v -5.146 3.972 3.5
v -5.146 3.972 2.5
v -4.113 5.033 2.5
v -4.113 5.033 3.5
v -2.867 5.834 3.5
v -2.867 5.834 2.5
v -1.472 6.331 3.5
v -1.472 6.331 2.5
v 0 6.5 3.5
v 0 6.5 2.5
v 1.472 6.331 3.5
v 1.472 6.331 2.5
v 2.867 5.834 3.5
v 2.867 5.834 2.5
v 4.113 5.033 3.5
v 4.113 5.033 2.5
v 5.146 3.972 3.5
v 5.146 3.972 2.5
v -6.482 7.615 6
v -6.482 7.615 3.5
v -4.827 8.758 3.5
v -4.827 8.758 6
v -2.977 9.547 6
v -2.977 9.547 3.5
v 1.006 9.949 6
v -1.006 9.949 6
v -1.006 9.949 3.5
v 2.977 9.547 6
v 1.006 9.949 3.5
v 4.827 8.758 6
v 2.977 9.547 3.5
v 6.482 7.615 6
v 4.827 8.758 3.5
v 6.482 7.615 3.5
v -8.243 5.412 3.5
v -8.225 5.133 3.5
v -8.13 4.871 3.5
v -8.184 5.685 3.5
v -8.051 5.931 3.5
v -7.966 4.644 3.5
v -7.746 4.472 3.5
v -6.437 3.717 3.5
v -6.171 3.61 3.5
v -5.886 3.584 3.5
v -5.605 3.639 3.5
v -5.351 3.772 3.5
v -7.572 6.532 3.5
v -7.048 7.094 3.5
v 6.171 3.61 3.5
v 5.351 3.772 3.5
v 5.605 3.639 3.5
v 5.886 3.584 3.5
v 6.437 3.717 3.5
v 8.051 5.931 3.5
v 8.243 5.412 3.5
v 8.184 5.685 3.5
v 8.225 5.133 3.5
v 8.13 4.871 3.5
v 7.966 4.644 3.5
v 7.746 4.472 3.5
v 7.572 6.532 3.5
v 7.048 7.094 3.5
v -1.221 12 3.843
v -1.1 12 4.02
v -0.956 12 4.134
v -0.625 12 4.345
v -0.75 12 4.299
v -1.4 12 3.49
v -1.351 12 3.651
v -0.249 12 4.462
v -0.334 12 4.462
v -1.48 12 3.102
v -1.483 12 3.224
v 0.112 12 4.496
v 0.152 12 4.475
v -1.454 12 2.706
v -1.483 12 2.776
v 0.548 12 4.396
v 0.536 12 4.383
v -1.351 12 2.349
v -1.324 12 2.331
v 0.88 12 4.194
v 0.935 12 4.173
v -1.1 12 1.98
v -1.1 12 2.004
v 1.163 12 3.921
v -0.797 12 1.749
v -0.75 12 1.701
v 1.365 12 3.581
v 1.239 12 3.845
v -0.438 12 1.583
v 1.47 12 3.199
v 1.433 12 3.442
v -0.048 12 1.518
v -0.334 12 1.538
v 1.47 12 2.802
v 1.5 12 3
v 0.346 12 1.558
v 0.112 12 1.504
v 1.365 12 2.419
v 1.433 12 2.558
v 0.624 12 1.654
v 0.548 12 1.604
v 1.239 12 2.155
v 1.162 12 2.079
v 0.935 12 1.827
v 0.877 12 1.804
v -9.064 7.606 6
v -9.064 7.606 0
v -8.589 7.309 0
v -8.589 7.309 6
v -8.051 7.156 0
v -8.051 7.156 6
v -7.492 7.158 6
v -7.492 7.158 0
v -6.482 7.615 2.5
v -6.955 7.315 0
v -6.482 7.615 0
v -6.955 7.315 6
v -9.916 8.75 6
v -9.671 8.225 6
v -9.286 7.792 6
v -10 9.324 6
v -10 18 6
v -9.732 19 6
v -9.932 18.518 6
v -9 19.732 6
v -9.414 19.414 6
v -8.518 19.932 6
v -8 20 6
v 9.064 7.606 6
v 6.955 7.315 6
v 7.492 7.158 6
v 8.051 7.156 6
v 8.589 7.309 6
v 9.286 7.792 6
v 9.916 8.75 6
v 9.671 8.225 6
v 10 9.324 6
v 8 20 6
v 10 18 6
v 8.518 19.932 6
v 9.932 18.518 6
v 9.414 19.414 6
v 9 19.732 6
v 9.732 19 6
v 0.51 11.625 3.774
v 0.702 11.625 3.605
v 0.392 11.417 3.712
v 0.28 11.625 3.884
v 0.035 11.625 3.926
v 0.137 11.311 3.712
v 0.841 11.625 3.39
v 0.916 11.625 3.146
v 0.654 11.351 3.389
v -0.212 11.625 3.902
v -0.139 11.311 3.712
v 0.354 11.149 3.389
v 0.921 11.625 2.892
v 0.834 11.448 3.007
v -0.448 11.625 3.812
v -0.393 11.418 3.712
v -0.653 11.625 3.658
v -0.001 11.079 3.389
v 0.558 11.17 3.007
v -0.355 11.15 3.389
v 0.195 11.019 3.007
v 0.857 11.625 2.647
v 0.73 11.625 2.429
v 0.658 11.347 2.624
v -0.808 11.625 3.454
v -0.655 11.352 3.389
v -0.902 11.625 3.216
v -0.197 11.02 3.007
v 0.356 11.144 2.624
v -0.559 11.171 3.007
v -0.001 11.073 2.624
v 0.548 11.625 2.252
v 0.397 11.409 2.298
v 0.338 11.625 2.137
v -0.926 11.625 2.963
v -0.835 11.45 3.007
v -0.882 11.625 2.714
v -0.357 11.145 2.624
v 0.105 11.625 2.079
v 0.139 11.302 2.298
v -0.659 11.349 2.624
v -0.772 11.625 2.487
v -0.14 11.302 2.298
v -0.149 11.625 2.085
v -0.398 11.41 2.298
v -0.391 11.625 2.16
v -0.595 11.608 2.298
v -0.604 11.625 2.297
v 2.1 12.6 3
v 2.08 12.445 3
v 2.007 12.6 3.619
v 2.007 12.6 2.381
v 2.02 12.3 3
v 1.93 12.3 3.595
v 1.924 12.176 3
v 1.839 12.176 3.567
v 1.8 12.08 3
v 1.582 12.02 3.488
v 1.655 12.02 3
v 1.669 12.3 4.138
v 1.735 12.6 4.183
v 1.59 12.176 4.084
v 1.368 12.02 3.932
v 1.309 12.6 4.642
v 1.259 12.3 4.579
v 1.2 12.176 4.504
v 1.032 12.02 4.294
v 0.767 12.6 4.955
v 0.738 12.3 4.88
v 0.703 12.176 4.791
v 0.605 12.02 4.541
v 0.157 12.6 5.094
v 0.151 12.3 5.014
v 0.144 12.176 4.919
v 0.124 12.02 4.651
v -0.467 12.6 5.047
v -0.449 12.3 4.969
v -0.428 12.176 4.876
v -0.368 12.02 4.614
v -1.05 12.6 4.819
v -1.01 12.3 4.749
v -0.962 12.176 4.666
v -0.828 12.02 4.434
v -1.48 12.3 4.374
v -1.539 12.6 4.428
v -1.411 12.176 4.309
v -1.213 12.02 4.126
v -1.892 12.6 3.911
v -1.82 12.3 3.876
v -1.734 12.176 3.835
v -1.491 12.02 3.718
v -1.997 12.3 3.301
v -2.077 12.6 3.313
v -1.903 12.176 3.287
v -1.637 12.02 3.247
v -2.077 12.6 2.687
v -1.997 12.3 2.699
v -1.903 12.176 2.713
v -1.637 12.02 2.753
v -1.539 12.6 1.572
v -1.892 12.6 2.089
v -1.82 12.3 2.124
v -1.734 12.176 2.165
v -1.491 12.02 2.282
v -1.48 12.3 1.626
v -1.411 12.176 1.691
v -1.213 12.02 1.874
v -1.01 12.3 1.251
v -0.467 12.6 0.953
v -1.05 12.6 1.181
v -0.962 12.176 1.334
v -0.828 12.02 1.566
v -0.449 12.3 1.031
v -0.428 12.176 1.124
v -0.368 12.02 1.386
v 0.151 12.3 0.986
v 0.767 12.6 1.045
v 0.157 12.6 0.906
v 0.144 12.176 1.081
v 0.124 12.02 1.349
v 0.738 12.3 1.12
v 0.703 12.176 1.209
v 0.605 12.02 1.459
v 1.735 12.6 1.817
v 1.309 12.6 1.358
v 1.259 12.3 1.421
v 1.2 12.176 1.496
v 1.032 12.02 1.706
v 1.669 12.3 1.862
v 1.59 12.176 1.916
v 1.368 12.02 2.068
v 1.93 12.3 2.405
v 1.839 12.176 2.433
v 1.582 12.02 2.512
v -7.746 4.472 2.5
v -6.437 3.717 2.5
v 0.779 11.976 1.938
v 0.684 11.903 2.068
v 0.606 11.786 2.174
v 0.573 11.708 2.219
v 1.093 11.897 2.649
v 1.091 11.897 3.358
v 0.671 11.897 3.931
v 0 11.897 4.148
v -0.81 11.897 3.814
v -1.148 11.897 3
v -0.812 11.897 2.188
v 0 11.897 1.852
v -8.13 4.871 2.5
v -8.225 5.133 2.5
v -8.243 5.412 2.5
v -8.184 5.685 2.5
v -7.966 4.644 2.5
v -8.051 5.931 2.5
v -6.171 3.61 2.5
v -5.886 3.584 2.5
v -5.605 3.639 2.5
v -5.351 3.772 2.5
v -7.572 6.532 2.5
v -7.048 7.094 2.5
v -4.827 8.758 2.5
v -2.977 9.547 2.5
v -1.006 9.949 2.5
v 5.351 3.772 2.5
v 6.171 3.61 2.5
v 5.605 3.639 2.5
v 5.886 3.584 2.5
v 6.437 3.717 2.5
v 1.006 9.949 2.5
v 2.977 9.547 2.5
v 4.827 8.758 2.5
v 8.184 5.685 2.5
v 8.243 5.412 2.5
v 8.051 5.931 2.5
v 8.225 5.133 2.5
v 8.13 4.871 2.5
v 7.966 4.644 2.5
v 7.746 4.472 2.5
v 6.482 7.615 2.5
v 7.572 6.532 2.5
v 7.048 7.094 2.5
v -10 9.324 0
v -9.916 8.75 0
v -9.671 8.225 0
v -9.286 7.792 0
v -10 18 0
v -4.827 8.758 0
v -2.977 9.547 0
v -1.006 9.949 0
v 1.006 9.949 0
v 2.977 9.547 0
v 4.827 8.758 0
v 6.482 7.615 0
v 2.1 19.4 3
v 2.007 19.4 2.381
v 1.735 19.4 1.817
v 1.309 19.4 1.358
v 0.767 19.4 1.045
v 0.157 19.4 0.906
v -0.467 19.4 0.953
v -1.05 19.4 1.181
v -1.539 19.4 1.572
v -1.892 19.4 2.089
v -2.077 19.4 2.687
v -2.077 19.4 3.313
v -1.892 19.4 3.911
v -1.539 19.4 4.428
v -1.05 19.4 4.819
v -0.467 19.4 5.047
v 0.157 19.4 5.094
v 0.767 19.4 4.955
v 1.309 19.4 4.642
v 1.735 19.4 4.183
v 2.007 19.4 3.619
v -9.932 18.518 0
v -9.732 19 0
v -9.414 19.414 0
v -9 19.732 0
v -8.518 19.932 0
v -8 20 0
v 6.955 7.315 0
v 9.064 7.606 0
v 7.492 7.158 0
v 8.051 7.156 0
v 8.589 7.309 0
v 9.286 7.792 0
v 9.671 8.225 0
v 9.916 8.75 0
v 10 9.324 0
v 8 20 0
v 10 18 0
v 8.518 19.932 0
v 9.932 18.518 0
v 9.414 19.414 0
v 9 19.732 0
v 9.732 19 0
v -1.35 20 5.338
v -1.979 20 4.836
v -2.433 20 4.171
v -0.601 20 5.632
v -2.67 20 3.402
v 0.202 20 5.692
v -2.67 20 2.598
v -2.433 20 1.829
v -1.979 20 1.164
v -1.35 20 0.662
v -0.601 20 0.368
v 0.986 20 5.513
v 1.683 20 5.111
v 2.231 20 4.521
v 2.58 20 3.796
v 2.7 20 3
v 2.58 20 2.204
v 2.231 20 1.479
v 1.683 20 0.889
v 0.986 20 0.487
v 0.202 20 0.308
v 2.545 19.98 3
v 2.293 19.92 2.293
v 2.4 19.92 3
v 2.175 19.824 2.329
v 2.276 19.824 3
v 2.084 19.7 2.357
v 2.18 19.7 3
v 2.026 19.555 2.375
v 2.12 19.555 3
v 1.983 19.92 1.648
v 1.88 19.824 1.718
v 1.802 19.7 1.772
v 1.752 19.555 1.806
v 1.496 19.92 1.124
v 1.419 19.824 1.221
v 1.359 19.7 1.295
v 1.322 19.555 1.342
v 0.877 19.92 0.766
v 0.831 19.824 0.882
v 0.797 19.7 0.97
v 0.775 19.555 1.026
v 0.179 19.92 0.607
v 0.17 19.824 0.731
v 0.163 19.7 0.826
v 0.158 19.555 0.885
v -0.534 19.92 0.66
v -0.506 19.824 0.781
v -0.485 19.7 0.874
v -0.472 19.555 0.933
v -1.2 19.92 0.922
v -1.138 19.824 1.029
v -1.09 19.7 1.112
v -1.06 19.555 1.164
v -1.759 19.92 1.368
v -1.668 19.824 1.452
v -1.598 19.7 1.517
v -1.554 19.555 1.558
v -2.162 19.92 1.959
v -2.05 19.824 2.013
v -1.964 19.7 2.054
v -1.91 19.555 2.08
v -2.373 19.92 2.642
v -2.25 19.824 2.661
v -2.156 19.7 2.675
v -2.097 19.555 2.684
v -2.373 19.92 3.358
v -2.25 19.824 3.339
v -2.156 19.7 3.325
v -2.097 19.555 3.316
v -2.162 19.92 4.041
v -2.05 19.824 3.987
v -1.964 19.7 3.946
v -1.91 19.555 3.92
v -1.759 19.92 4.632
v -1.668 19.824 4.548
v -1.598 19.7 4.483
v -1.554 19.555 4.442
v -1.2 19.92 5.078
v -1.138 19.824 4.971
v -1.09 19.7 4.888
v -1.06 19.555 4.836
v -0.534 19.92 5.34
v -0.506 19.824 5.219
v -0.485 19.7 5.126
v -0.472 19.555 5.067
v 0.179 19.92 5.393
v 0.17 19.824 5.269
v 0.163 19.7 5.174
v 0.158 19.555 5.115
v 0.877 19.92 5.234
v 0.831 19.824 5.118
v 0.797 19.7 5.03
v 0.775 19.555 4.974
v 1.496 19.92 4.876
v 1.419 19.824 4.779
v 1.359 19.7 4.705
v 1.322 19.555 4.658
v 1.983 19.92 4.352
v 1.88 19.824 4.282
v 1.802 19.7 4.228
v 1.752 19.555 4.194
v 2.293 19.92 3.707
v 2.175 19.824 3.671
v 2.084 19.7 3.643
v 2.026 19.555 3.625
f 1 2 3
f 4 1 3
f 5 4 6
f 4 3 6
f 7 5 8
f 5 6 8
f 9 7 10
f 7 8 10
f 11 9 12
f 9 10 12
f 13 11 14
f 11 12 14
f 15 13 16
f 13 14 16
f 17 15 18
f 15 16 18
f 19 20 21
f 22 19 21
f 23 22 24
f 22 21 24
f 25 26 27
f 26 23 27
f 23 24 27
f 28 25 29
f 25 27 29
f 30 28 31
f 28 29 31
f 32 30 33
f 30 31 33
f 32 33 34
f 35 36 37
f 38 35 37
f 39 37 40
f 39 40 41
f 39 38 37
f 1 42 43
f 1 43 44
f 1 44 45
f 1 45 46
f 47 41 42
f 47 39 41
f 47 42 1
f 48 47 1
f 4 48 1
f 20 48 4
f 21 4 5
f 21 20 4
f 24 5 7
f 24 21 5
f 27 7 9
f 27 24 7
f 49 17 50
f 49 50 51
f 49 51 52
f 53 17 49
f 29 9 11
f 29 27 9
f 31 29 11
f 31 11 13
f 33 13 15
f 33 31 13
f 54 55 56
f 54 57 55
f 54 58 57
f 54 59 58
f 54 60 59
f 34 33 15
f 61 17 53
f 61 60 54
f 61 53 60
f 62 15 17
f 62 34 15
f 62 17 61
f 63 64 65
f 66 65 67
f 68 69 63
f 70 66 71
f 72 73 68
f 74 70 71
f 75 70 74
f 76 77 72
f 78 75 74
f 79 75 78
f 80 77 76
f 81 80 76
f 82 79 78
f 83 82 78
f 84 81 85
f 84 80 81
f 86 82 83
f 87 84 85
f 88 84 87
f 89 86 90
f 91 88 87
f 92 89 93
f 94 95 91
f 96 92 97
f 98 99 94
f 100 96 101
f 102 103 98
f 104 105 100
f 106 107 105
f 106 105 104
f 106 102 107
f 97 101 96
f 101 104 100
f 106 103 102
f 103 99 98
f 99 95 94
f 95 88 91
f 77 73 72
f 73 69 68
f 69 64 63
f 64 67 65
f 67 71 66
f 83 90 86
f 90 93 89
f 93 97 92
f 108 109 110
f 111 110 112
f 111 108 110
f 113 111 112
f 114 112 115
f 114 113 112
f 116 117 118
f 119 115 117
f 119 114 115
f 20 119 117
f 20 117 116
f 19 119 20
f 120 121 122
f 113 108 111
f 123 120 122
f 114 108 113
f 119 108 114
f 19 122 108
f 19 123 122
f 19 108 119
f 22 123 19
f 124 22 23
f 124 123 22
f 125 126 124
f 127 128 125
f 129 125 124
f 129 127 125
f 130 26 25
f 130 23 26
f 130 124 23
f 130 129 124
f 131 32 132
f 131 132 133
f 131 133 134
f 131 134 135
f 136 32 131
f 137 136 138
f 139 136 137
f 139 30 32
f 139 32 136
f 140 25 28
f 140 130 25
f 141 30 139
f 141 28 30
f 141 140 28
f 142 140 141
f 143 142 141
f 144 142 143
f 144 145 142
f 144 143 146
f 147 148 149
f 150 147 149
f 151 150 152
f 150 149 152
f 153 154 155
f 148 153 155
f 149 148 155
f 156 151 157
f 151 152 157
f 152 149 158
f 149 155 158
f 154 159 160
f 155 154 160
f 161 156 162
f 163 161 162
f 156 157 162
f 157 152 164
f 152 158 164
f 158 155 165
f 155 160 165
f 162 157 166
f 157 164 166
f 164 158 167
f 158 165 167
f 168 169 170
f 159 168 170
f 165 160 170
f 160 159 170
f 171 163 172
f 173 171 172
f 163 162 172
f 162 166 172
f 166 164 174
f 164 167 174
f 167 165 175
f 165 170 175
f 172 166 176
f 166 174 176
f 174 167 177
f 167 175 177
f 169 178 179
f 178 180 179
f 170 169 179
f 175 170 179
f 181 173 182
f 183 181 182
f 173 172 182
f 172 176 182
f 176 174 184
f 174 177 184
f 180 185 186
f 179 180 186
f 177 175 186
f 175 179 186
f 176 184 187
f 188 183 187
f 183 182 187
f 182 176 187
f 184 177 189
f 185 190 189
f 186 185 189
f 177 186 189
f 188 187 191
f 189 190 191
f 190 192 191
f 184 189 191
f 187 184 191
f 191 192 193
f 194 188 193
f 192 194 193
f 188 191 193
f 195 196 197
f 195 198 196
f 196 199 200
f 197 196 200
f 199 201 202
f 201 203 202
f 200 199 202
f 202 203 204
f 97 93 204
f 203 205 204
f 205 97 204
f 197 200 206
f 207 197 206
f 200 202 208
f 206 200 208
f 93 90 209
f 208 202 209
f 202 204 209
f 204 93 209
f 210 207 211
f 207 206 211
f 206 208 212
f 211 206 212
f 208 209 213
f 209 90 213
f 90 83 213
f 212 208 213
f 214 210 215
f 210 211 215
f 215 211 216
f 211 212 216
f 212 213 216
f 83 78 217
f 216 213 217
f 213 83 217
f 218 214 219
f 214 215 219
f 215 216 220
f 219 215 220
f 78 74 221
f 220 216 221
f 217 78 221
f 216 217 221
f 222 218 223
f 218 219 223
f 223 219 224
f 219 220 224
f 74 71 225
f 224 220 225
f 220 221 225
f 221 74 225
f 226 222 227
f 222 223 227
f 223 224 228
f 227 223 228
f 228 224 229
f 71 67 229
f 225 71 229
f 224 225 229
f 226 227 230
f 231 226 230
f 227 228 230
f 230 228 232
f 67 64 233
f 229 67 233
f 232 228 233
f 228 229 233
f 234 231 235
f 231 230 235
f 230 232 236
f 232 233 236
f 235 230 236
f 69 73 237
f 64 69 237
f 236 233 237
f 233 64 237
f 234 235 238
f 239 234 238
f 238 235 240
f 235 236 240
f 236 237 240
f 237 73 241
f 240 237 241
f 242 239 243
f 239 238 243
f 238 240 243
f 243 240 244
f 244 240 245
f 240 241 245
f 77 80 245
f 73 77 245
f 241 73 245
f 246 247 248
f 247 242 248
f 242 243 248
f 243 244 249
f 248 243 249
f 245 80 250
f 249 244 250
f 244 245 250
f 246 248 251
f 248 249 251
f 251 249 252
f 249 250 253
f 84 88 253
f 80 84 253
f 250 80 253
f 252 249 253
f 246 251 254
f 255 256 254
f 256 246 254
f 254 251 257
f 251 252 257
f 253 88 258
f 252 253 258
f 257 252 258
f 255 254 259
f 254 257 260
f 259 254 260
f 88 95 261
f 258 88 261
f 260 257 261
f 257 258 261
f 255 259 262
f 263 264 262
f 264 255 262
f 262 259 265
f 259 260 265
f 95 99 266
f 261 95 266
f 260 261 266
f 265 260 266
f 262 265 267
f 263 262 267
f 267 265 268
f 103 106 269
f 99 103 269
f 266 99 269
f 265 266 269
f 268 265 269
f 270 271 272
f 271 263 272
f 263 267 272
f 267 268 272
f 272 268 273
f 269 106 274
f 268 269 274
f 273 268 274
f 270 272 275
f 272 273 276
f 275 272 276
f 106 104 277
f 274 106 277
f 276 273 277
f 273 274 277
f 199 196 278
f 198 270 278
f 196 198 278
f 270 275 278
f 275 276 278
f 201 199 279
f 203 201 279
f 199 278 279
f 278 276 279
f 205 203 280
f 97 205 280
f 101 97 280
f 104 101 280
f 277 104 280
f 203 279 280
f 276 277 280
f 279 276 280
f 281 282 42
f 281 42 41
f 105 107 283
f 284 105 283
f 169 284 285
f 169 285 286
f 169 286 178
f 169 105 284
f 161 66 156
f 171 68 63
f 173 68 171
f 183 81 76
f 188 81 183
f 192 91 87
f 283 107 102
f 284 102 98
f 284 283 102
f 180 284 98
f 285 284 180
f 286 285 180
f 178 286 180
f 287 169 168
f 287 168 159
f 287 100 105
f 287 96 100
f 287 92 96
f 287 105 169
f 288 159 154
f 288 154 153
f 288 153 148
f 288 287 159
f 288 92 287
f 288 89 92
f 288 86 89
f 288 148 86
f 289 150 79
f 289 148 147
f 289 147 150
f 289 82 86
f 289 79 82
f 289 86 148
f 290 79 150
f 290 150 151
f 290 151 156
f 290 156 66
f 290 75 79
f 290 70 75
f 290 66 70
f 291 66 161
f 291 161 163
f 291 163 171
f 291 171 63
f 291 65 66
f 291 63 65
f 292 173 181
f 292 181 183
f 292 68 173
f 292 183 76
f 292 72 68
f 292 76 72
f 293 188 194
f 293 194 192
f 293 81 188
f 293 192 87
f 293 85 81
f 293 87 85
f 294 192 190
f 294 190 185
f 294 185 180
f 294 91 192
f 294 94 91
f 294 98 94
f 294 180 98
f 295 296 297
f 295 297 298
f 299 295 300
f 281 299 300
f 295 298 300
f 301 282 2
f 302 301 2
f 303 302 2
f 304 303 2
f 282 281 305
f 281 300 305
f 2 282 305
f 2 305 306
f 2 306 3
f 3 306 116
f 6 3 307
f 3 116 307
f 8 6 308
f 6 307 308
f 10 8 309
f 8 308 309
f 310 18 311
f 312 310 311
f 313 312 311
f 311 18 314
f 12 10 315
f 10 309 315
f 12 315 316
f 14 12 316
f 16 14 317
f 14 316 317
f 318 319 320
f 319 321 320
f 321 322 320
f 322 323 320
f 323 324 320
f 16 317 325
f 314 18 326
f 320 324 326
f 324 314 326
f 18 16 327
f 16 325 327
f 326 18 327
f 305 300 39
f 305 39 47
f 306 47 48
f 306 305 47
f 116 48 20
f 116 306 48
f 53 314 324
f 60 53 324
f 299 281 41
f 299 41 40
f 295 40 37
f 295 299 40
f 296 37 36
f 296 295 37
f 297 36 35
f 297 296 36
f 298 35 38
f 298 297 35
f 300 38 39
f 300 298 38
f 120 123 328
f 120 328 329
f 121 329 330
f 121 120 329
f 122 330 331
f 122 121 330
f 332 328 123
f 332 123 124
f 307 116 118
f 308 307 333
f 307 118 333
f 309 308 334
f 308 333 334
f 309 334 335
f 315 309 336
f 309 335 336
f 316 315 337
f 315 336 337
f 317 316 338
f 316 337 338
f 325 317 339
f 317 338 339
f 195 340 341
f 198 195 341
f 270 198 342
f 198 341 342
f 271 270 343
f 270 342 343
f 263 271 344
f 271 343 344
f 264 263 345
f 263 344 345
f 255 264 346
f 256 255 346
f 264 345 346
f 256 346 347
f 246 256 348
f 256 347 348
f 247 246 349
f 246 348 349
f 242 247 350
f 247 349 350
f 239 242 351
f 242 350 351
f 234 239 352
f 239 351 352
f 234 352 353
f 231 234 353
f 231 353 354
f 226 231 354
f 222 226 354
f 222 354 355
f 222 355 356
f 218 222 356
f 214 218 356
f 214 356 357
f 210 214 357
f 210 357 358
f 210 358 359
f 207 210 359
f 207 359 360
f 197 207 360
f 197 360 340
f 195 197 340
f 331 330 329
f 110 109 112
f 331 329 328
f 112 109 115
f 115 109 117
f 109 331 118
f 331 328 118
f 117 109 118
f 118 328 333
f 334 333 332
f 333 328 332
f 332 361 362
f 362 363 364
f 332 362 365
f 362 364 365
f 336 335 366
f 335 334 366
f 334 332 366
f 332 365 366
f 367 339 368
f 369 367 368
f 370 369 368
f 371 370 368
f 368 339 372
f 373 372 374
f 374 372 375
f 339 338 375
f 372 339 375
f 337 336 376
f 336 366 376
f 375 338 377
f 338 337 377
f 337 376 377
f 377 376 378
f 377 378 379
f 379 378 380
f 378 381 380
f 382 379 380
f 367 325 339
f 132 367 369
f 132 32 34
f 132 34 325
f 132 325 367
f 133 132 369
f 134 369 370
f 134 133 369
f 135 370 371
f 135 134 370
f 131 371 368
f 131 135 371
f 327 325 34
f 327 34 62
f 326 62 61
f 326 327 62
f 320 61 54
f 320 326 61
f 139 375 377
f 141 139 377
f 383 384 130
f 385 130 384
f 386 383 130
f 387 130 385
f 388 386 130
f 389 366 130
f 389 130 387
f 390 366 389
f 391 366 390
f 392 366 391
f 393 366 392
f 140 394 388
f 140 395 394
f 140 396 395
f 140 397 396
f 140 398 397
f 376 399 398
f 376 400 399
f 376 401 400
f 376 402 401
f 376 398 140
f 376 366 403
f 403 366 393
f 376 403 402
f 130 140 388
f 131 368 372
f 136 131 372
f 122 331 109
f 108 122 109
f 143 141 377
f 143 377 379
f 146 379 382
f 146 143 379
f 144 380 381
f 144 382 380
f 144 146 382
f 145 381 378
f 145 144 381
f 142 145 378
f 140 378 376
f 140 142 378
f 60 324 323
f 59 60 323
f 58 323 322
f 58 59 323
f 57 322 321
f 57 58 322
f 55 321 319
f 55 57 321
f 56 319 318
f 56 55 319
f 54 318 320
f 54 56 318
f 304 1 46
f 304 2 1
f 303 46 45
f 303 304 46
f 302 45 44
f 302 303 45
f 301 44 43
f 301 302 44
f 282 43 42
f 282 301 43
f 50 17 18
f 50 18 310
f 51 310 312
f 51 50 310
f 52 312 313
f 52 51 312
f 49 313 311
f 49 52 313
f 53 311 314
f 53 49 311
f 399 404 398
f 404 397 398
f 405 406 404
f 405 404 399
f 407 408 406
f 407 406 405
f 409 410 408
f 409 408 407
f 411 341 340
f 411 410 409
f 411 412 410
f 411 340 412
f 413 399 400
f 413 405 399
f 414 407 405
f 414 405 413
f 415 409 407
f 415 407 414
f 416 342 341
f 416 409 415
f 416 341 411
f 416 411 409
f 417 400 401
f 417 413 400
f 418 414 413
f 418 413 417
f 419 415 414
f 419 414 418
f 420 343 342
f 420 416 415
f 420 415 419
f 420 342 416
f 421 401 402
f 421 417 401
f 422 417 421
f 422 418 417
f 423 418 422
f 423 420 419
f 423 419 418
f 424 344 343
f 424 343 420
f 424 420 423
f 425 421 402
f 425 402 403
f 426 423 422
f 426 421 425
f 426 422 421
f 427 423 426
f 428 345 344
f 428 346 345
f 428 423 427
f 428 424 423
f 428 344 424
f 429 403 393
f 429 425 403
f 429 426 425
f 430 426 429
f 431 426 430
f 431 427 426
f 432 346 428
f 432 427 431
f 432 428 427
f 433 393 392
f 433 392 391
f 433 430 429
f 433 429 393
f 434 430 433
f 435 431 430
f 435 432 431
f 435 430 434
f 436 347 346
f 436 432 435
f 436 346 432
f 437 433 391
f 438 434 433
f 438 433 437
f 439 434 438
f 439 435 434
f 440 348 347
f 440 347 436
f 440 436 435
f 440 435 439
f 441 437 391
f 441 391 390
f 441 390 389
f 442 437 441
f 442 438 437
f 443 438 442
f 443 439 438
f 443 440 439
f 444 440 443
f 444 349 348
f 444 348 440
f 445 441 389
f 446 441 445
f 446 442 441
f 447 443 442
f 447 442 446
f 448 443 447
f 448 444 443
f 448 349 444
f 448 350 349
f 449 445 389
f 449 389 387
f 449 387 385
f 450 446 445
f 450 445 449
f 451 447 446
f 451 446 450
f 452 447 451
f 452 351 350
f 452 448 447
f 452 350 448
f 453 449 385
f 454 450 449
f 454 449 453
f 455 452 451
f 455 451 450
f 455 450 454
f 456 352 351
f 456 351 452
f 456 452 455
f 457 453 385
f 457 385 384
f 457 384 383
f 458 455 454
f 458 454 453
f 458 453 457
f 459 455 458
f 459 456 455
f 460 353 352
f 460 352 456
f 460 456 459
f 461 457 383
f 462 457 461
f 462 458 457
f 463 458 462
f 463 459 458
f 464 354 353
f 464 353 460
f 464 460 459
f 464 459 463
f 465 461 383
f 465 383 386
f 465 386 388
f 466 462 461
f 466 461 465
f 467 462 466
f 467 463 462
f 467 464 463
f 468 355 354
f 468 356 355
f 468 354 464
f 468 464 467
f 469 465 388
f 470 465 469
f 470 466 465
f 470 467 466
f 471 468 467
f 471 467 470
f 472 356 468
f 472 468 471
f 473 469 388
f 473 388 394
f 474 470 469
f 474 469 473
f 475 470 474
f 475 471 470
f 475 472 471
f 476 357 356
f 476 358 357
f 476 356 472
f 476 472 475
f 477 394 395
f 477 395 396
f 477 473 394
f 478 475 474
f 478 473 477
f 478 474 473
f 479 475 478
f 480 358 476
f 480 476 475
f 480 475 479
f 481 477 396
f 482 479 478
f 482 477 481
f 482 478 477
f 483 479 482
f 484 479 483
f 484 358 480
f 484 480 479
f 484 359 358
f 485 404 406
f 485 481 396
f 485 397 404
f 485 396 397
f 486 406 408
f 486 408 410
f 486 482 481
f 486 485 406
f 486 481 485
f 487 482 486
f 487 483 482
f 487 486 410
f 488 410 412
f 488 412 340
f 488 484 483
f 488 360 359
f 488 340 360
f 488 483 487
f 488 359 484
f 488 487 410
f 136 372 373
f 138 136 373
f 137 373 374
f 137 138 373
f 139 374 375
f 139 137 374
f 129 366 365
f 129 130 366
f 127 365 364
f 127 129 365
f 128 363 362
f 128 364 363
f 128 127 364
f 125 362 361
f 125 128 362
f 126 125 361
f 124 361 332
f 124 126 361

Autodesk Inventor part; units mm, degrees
ref_plane "YZ Plane" through (0, 0, 0) normal (1, 0, 0) x (0, 1, 0)
ref_plane "XZ Plane" through (0, 0, 0) normal (0, 1, 0) x (-1, 0, 0)
sketch "Эскиз1" plane through (0, 0, 0) normal (0, 0, 1) x (1, 0, 0)
  line L0 (0, 0) -> (-14.5, 0)
  line L1 (14.5, 0) -> (0, 0)
  line L2 (0, -16) -> (0, 26) construction
  line L3 (-20.3, 0) -> (20.3, 0) construction
  line L4 (-10, 0) -> (-10, 20)
  line L5 (10, 0) -> (10, 20)
  line L6 (-10, 20) -> (10, 20)
  line L7 (-10, 8.391) -> (0, 0)
  line L8 (0, 0) -> (10, 8.391)
  circle A0 centre (0, 0) radius 10
  point P0 (-7.6604, 6.4279)
  point P1 (7.6604, 6.4279)
  dimension "d2" = 180
  dimension "d3" = 90
  dimension "d26" = 20
  dimension "d47" = 40
  dimension "d48" = 40
  dimension "d49" = 20
extrude "Выдавливание1" add sketch "Эскиз1" along normal blind 6 contours L7 L4 L6 L5 L8 A0
sketch "Эскиз5" plane through (-10, 20, 0) normal (0, 1, 0) x (1, 0, 0)
  line L0 (10, 0) -> (10, -6) construction
  line L1 (20, -6) -> (0, -6) projected
  circle A0 centre (10, -3) radius 2.1
  dimension "d50" = 4.2
extrude "Выдавливание3" cut sketch "Эскиз5" against normal blind 8
sketch "Эскиз6" plane through (0, 12, 3) normal (0, 1, 0) x (1, 0, 0)
  circle A0 centre (0, 0) radius 2.1 projected
  circle A1 centre (0, 0) radius 1
  line L0 (0, -1) -> (0, 1)
  point P0 (0, 3)
  dimension "d53" = 2
revolve "Вращение4" cut sketch "Эскиз6" angle 360 about axis through (0, 12, 4) along (0, 0, -1) picked at (0.2078, 0.2606) contours A1 L0
fillet "Сопряжение6" radius 0.6 4 edges at (-2.1, 20, 3) (-2.1, 12, 3) (1, 12, 3) (-1, 12, 3)
fillet "Сопряжение6" radius 2 6 edges at (-7.6604, 6.4279, 3) (7.6604, 6.4279, 3) (-10, 8.391, 3) (10, 8.391, 3) (-10, 20, 3) (10, 20, 3)
ref_plane "РабПлоскость3" through (0, 0, 3) normal (0, 0, 1) x (1, 0, 0)
sketch "Эскиз7" plane through (0, 0, 3) normal (0, 0, 1) x (1, 0, 0)
  circle A0 centre (0, 0) radius 6.5
  circle A1 centre (0, 0) radius 10
  arc A2 (6.482, 7.6147) -> (-6.482, 7.6147) centre (0, 0) ccw projected
  line L0 (0, 0) -> (-8.6603, 5)
  line L1 (0, 0) -> (8.6603, 5)
  line L2 (-14, 0) -> (14, 0) construction
  point P0 (5.6292, 3.25)
  point P1 (-5.6292, 3.25)
  dimension "d57" = 13
  dimension "d61" = 30
  dimension "d62" = 30
extrude "Выдавливание4" add sketch "Эскиз7" along normal mid plane 1 contours A0 L0 A1 L1 picked at (4.8613, 7.3201)
fillet "Сопряжение7" radius 1 4 edges at (-5.6292, 3.25, 3) (5.6292, 3.25, 3) (8.6603, 5, 3) (-8.6603, 5, 3)
equation "\"d3\" = 0.5 * d2"
equation "\"d48\" = d47"
properties part number "Бегунок"
